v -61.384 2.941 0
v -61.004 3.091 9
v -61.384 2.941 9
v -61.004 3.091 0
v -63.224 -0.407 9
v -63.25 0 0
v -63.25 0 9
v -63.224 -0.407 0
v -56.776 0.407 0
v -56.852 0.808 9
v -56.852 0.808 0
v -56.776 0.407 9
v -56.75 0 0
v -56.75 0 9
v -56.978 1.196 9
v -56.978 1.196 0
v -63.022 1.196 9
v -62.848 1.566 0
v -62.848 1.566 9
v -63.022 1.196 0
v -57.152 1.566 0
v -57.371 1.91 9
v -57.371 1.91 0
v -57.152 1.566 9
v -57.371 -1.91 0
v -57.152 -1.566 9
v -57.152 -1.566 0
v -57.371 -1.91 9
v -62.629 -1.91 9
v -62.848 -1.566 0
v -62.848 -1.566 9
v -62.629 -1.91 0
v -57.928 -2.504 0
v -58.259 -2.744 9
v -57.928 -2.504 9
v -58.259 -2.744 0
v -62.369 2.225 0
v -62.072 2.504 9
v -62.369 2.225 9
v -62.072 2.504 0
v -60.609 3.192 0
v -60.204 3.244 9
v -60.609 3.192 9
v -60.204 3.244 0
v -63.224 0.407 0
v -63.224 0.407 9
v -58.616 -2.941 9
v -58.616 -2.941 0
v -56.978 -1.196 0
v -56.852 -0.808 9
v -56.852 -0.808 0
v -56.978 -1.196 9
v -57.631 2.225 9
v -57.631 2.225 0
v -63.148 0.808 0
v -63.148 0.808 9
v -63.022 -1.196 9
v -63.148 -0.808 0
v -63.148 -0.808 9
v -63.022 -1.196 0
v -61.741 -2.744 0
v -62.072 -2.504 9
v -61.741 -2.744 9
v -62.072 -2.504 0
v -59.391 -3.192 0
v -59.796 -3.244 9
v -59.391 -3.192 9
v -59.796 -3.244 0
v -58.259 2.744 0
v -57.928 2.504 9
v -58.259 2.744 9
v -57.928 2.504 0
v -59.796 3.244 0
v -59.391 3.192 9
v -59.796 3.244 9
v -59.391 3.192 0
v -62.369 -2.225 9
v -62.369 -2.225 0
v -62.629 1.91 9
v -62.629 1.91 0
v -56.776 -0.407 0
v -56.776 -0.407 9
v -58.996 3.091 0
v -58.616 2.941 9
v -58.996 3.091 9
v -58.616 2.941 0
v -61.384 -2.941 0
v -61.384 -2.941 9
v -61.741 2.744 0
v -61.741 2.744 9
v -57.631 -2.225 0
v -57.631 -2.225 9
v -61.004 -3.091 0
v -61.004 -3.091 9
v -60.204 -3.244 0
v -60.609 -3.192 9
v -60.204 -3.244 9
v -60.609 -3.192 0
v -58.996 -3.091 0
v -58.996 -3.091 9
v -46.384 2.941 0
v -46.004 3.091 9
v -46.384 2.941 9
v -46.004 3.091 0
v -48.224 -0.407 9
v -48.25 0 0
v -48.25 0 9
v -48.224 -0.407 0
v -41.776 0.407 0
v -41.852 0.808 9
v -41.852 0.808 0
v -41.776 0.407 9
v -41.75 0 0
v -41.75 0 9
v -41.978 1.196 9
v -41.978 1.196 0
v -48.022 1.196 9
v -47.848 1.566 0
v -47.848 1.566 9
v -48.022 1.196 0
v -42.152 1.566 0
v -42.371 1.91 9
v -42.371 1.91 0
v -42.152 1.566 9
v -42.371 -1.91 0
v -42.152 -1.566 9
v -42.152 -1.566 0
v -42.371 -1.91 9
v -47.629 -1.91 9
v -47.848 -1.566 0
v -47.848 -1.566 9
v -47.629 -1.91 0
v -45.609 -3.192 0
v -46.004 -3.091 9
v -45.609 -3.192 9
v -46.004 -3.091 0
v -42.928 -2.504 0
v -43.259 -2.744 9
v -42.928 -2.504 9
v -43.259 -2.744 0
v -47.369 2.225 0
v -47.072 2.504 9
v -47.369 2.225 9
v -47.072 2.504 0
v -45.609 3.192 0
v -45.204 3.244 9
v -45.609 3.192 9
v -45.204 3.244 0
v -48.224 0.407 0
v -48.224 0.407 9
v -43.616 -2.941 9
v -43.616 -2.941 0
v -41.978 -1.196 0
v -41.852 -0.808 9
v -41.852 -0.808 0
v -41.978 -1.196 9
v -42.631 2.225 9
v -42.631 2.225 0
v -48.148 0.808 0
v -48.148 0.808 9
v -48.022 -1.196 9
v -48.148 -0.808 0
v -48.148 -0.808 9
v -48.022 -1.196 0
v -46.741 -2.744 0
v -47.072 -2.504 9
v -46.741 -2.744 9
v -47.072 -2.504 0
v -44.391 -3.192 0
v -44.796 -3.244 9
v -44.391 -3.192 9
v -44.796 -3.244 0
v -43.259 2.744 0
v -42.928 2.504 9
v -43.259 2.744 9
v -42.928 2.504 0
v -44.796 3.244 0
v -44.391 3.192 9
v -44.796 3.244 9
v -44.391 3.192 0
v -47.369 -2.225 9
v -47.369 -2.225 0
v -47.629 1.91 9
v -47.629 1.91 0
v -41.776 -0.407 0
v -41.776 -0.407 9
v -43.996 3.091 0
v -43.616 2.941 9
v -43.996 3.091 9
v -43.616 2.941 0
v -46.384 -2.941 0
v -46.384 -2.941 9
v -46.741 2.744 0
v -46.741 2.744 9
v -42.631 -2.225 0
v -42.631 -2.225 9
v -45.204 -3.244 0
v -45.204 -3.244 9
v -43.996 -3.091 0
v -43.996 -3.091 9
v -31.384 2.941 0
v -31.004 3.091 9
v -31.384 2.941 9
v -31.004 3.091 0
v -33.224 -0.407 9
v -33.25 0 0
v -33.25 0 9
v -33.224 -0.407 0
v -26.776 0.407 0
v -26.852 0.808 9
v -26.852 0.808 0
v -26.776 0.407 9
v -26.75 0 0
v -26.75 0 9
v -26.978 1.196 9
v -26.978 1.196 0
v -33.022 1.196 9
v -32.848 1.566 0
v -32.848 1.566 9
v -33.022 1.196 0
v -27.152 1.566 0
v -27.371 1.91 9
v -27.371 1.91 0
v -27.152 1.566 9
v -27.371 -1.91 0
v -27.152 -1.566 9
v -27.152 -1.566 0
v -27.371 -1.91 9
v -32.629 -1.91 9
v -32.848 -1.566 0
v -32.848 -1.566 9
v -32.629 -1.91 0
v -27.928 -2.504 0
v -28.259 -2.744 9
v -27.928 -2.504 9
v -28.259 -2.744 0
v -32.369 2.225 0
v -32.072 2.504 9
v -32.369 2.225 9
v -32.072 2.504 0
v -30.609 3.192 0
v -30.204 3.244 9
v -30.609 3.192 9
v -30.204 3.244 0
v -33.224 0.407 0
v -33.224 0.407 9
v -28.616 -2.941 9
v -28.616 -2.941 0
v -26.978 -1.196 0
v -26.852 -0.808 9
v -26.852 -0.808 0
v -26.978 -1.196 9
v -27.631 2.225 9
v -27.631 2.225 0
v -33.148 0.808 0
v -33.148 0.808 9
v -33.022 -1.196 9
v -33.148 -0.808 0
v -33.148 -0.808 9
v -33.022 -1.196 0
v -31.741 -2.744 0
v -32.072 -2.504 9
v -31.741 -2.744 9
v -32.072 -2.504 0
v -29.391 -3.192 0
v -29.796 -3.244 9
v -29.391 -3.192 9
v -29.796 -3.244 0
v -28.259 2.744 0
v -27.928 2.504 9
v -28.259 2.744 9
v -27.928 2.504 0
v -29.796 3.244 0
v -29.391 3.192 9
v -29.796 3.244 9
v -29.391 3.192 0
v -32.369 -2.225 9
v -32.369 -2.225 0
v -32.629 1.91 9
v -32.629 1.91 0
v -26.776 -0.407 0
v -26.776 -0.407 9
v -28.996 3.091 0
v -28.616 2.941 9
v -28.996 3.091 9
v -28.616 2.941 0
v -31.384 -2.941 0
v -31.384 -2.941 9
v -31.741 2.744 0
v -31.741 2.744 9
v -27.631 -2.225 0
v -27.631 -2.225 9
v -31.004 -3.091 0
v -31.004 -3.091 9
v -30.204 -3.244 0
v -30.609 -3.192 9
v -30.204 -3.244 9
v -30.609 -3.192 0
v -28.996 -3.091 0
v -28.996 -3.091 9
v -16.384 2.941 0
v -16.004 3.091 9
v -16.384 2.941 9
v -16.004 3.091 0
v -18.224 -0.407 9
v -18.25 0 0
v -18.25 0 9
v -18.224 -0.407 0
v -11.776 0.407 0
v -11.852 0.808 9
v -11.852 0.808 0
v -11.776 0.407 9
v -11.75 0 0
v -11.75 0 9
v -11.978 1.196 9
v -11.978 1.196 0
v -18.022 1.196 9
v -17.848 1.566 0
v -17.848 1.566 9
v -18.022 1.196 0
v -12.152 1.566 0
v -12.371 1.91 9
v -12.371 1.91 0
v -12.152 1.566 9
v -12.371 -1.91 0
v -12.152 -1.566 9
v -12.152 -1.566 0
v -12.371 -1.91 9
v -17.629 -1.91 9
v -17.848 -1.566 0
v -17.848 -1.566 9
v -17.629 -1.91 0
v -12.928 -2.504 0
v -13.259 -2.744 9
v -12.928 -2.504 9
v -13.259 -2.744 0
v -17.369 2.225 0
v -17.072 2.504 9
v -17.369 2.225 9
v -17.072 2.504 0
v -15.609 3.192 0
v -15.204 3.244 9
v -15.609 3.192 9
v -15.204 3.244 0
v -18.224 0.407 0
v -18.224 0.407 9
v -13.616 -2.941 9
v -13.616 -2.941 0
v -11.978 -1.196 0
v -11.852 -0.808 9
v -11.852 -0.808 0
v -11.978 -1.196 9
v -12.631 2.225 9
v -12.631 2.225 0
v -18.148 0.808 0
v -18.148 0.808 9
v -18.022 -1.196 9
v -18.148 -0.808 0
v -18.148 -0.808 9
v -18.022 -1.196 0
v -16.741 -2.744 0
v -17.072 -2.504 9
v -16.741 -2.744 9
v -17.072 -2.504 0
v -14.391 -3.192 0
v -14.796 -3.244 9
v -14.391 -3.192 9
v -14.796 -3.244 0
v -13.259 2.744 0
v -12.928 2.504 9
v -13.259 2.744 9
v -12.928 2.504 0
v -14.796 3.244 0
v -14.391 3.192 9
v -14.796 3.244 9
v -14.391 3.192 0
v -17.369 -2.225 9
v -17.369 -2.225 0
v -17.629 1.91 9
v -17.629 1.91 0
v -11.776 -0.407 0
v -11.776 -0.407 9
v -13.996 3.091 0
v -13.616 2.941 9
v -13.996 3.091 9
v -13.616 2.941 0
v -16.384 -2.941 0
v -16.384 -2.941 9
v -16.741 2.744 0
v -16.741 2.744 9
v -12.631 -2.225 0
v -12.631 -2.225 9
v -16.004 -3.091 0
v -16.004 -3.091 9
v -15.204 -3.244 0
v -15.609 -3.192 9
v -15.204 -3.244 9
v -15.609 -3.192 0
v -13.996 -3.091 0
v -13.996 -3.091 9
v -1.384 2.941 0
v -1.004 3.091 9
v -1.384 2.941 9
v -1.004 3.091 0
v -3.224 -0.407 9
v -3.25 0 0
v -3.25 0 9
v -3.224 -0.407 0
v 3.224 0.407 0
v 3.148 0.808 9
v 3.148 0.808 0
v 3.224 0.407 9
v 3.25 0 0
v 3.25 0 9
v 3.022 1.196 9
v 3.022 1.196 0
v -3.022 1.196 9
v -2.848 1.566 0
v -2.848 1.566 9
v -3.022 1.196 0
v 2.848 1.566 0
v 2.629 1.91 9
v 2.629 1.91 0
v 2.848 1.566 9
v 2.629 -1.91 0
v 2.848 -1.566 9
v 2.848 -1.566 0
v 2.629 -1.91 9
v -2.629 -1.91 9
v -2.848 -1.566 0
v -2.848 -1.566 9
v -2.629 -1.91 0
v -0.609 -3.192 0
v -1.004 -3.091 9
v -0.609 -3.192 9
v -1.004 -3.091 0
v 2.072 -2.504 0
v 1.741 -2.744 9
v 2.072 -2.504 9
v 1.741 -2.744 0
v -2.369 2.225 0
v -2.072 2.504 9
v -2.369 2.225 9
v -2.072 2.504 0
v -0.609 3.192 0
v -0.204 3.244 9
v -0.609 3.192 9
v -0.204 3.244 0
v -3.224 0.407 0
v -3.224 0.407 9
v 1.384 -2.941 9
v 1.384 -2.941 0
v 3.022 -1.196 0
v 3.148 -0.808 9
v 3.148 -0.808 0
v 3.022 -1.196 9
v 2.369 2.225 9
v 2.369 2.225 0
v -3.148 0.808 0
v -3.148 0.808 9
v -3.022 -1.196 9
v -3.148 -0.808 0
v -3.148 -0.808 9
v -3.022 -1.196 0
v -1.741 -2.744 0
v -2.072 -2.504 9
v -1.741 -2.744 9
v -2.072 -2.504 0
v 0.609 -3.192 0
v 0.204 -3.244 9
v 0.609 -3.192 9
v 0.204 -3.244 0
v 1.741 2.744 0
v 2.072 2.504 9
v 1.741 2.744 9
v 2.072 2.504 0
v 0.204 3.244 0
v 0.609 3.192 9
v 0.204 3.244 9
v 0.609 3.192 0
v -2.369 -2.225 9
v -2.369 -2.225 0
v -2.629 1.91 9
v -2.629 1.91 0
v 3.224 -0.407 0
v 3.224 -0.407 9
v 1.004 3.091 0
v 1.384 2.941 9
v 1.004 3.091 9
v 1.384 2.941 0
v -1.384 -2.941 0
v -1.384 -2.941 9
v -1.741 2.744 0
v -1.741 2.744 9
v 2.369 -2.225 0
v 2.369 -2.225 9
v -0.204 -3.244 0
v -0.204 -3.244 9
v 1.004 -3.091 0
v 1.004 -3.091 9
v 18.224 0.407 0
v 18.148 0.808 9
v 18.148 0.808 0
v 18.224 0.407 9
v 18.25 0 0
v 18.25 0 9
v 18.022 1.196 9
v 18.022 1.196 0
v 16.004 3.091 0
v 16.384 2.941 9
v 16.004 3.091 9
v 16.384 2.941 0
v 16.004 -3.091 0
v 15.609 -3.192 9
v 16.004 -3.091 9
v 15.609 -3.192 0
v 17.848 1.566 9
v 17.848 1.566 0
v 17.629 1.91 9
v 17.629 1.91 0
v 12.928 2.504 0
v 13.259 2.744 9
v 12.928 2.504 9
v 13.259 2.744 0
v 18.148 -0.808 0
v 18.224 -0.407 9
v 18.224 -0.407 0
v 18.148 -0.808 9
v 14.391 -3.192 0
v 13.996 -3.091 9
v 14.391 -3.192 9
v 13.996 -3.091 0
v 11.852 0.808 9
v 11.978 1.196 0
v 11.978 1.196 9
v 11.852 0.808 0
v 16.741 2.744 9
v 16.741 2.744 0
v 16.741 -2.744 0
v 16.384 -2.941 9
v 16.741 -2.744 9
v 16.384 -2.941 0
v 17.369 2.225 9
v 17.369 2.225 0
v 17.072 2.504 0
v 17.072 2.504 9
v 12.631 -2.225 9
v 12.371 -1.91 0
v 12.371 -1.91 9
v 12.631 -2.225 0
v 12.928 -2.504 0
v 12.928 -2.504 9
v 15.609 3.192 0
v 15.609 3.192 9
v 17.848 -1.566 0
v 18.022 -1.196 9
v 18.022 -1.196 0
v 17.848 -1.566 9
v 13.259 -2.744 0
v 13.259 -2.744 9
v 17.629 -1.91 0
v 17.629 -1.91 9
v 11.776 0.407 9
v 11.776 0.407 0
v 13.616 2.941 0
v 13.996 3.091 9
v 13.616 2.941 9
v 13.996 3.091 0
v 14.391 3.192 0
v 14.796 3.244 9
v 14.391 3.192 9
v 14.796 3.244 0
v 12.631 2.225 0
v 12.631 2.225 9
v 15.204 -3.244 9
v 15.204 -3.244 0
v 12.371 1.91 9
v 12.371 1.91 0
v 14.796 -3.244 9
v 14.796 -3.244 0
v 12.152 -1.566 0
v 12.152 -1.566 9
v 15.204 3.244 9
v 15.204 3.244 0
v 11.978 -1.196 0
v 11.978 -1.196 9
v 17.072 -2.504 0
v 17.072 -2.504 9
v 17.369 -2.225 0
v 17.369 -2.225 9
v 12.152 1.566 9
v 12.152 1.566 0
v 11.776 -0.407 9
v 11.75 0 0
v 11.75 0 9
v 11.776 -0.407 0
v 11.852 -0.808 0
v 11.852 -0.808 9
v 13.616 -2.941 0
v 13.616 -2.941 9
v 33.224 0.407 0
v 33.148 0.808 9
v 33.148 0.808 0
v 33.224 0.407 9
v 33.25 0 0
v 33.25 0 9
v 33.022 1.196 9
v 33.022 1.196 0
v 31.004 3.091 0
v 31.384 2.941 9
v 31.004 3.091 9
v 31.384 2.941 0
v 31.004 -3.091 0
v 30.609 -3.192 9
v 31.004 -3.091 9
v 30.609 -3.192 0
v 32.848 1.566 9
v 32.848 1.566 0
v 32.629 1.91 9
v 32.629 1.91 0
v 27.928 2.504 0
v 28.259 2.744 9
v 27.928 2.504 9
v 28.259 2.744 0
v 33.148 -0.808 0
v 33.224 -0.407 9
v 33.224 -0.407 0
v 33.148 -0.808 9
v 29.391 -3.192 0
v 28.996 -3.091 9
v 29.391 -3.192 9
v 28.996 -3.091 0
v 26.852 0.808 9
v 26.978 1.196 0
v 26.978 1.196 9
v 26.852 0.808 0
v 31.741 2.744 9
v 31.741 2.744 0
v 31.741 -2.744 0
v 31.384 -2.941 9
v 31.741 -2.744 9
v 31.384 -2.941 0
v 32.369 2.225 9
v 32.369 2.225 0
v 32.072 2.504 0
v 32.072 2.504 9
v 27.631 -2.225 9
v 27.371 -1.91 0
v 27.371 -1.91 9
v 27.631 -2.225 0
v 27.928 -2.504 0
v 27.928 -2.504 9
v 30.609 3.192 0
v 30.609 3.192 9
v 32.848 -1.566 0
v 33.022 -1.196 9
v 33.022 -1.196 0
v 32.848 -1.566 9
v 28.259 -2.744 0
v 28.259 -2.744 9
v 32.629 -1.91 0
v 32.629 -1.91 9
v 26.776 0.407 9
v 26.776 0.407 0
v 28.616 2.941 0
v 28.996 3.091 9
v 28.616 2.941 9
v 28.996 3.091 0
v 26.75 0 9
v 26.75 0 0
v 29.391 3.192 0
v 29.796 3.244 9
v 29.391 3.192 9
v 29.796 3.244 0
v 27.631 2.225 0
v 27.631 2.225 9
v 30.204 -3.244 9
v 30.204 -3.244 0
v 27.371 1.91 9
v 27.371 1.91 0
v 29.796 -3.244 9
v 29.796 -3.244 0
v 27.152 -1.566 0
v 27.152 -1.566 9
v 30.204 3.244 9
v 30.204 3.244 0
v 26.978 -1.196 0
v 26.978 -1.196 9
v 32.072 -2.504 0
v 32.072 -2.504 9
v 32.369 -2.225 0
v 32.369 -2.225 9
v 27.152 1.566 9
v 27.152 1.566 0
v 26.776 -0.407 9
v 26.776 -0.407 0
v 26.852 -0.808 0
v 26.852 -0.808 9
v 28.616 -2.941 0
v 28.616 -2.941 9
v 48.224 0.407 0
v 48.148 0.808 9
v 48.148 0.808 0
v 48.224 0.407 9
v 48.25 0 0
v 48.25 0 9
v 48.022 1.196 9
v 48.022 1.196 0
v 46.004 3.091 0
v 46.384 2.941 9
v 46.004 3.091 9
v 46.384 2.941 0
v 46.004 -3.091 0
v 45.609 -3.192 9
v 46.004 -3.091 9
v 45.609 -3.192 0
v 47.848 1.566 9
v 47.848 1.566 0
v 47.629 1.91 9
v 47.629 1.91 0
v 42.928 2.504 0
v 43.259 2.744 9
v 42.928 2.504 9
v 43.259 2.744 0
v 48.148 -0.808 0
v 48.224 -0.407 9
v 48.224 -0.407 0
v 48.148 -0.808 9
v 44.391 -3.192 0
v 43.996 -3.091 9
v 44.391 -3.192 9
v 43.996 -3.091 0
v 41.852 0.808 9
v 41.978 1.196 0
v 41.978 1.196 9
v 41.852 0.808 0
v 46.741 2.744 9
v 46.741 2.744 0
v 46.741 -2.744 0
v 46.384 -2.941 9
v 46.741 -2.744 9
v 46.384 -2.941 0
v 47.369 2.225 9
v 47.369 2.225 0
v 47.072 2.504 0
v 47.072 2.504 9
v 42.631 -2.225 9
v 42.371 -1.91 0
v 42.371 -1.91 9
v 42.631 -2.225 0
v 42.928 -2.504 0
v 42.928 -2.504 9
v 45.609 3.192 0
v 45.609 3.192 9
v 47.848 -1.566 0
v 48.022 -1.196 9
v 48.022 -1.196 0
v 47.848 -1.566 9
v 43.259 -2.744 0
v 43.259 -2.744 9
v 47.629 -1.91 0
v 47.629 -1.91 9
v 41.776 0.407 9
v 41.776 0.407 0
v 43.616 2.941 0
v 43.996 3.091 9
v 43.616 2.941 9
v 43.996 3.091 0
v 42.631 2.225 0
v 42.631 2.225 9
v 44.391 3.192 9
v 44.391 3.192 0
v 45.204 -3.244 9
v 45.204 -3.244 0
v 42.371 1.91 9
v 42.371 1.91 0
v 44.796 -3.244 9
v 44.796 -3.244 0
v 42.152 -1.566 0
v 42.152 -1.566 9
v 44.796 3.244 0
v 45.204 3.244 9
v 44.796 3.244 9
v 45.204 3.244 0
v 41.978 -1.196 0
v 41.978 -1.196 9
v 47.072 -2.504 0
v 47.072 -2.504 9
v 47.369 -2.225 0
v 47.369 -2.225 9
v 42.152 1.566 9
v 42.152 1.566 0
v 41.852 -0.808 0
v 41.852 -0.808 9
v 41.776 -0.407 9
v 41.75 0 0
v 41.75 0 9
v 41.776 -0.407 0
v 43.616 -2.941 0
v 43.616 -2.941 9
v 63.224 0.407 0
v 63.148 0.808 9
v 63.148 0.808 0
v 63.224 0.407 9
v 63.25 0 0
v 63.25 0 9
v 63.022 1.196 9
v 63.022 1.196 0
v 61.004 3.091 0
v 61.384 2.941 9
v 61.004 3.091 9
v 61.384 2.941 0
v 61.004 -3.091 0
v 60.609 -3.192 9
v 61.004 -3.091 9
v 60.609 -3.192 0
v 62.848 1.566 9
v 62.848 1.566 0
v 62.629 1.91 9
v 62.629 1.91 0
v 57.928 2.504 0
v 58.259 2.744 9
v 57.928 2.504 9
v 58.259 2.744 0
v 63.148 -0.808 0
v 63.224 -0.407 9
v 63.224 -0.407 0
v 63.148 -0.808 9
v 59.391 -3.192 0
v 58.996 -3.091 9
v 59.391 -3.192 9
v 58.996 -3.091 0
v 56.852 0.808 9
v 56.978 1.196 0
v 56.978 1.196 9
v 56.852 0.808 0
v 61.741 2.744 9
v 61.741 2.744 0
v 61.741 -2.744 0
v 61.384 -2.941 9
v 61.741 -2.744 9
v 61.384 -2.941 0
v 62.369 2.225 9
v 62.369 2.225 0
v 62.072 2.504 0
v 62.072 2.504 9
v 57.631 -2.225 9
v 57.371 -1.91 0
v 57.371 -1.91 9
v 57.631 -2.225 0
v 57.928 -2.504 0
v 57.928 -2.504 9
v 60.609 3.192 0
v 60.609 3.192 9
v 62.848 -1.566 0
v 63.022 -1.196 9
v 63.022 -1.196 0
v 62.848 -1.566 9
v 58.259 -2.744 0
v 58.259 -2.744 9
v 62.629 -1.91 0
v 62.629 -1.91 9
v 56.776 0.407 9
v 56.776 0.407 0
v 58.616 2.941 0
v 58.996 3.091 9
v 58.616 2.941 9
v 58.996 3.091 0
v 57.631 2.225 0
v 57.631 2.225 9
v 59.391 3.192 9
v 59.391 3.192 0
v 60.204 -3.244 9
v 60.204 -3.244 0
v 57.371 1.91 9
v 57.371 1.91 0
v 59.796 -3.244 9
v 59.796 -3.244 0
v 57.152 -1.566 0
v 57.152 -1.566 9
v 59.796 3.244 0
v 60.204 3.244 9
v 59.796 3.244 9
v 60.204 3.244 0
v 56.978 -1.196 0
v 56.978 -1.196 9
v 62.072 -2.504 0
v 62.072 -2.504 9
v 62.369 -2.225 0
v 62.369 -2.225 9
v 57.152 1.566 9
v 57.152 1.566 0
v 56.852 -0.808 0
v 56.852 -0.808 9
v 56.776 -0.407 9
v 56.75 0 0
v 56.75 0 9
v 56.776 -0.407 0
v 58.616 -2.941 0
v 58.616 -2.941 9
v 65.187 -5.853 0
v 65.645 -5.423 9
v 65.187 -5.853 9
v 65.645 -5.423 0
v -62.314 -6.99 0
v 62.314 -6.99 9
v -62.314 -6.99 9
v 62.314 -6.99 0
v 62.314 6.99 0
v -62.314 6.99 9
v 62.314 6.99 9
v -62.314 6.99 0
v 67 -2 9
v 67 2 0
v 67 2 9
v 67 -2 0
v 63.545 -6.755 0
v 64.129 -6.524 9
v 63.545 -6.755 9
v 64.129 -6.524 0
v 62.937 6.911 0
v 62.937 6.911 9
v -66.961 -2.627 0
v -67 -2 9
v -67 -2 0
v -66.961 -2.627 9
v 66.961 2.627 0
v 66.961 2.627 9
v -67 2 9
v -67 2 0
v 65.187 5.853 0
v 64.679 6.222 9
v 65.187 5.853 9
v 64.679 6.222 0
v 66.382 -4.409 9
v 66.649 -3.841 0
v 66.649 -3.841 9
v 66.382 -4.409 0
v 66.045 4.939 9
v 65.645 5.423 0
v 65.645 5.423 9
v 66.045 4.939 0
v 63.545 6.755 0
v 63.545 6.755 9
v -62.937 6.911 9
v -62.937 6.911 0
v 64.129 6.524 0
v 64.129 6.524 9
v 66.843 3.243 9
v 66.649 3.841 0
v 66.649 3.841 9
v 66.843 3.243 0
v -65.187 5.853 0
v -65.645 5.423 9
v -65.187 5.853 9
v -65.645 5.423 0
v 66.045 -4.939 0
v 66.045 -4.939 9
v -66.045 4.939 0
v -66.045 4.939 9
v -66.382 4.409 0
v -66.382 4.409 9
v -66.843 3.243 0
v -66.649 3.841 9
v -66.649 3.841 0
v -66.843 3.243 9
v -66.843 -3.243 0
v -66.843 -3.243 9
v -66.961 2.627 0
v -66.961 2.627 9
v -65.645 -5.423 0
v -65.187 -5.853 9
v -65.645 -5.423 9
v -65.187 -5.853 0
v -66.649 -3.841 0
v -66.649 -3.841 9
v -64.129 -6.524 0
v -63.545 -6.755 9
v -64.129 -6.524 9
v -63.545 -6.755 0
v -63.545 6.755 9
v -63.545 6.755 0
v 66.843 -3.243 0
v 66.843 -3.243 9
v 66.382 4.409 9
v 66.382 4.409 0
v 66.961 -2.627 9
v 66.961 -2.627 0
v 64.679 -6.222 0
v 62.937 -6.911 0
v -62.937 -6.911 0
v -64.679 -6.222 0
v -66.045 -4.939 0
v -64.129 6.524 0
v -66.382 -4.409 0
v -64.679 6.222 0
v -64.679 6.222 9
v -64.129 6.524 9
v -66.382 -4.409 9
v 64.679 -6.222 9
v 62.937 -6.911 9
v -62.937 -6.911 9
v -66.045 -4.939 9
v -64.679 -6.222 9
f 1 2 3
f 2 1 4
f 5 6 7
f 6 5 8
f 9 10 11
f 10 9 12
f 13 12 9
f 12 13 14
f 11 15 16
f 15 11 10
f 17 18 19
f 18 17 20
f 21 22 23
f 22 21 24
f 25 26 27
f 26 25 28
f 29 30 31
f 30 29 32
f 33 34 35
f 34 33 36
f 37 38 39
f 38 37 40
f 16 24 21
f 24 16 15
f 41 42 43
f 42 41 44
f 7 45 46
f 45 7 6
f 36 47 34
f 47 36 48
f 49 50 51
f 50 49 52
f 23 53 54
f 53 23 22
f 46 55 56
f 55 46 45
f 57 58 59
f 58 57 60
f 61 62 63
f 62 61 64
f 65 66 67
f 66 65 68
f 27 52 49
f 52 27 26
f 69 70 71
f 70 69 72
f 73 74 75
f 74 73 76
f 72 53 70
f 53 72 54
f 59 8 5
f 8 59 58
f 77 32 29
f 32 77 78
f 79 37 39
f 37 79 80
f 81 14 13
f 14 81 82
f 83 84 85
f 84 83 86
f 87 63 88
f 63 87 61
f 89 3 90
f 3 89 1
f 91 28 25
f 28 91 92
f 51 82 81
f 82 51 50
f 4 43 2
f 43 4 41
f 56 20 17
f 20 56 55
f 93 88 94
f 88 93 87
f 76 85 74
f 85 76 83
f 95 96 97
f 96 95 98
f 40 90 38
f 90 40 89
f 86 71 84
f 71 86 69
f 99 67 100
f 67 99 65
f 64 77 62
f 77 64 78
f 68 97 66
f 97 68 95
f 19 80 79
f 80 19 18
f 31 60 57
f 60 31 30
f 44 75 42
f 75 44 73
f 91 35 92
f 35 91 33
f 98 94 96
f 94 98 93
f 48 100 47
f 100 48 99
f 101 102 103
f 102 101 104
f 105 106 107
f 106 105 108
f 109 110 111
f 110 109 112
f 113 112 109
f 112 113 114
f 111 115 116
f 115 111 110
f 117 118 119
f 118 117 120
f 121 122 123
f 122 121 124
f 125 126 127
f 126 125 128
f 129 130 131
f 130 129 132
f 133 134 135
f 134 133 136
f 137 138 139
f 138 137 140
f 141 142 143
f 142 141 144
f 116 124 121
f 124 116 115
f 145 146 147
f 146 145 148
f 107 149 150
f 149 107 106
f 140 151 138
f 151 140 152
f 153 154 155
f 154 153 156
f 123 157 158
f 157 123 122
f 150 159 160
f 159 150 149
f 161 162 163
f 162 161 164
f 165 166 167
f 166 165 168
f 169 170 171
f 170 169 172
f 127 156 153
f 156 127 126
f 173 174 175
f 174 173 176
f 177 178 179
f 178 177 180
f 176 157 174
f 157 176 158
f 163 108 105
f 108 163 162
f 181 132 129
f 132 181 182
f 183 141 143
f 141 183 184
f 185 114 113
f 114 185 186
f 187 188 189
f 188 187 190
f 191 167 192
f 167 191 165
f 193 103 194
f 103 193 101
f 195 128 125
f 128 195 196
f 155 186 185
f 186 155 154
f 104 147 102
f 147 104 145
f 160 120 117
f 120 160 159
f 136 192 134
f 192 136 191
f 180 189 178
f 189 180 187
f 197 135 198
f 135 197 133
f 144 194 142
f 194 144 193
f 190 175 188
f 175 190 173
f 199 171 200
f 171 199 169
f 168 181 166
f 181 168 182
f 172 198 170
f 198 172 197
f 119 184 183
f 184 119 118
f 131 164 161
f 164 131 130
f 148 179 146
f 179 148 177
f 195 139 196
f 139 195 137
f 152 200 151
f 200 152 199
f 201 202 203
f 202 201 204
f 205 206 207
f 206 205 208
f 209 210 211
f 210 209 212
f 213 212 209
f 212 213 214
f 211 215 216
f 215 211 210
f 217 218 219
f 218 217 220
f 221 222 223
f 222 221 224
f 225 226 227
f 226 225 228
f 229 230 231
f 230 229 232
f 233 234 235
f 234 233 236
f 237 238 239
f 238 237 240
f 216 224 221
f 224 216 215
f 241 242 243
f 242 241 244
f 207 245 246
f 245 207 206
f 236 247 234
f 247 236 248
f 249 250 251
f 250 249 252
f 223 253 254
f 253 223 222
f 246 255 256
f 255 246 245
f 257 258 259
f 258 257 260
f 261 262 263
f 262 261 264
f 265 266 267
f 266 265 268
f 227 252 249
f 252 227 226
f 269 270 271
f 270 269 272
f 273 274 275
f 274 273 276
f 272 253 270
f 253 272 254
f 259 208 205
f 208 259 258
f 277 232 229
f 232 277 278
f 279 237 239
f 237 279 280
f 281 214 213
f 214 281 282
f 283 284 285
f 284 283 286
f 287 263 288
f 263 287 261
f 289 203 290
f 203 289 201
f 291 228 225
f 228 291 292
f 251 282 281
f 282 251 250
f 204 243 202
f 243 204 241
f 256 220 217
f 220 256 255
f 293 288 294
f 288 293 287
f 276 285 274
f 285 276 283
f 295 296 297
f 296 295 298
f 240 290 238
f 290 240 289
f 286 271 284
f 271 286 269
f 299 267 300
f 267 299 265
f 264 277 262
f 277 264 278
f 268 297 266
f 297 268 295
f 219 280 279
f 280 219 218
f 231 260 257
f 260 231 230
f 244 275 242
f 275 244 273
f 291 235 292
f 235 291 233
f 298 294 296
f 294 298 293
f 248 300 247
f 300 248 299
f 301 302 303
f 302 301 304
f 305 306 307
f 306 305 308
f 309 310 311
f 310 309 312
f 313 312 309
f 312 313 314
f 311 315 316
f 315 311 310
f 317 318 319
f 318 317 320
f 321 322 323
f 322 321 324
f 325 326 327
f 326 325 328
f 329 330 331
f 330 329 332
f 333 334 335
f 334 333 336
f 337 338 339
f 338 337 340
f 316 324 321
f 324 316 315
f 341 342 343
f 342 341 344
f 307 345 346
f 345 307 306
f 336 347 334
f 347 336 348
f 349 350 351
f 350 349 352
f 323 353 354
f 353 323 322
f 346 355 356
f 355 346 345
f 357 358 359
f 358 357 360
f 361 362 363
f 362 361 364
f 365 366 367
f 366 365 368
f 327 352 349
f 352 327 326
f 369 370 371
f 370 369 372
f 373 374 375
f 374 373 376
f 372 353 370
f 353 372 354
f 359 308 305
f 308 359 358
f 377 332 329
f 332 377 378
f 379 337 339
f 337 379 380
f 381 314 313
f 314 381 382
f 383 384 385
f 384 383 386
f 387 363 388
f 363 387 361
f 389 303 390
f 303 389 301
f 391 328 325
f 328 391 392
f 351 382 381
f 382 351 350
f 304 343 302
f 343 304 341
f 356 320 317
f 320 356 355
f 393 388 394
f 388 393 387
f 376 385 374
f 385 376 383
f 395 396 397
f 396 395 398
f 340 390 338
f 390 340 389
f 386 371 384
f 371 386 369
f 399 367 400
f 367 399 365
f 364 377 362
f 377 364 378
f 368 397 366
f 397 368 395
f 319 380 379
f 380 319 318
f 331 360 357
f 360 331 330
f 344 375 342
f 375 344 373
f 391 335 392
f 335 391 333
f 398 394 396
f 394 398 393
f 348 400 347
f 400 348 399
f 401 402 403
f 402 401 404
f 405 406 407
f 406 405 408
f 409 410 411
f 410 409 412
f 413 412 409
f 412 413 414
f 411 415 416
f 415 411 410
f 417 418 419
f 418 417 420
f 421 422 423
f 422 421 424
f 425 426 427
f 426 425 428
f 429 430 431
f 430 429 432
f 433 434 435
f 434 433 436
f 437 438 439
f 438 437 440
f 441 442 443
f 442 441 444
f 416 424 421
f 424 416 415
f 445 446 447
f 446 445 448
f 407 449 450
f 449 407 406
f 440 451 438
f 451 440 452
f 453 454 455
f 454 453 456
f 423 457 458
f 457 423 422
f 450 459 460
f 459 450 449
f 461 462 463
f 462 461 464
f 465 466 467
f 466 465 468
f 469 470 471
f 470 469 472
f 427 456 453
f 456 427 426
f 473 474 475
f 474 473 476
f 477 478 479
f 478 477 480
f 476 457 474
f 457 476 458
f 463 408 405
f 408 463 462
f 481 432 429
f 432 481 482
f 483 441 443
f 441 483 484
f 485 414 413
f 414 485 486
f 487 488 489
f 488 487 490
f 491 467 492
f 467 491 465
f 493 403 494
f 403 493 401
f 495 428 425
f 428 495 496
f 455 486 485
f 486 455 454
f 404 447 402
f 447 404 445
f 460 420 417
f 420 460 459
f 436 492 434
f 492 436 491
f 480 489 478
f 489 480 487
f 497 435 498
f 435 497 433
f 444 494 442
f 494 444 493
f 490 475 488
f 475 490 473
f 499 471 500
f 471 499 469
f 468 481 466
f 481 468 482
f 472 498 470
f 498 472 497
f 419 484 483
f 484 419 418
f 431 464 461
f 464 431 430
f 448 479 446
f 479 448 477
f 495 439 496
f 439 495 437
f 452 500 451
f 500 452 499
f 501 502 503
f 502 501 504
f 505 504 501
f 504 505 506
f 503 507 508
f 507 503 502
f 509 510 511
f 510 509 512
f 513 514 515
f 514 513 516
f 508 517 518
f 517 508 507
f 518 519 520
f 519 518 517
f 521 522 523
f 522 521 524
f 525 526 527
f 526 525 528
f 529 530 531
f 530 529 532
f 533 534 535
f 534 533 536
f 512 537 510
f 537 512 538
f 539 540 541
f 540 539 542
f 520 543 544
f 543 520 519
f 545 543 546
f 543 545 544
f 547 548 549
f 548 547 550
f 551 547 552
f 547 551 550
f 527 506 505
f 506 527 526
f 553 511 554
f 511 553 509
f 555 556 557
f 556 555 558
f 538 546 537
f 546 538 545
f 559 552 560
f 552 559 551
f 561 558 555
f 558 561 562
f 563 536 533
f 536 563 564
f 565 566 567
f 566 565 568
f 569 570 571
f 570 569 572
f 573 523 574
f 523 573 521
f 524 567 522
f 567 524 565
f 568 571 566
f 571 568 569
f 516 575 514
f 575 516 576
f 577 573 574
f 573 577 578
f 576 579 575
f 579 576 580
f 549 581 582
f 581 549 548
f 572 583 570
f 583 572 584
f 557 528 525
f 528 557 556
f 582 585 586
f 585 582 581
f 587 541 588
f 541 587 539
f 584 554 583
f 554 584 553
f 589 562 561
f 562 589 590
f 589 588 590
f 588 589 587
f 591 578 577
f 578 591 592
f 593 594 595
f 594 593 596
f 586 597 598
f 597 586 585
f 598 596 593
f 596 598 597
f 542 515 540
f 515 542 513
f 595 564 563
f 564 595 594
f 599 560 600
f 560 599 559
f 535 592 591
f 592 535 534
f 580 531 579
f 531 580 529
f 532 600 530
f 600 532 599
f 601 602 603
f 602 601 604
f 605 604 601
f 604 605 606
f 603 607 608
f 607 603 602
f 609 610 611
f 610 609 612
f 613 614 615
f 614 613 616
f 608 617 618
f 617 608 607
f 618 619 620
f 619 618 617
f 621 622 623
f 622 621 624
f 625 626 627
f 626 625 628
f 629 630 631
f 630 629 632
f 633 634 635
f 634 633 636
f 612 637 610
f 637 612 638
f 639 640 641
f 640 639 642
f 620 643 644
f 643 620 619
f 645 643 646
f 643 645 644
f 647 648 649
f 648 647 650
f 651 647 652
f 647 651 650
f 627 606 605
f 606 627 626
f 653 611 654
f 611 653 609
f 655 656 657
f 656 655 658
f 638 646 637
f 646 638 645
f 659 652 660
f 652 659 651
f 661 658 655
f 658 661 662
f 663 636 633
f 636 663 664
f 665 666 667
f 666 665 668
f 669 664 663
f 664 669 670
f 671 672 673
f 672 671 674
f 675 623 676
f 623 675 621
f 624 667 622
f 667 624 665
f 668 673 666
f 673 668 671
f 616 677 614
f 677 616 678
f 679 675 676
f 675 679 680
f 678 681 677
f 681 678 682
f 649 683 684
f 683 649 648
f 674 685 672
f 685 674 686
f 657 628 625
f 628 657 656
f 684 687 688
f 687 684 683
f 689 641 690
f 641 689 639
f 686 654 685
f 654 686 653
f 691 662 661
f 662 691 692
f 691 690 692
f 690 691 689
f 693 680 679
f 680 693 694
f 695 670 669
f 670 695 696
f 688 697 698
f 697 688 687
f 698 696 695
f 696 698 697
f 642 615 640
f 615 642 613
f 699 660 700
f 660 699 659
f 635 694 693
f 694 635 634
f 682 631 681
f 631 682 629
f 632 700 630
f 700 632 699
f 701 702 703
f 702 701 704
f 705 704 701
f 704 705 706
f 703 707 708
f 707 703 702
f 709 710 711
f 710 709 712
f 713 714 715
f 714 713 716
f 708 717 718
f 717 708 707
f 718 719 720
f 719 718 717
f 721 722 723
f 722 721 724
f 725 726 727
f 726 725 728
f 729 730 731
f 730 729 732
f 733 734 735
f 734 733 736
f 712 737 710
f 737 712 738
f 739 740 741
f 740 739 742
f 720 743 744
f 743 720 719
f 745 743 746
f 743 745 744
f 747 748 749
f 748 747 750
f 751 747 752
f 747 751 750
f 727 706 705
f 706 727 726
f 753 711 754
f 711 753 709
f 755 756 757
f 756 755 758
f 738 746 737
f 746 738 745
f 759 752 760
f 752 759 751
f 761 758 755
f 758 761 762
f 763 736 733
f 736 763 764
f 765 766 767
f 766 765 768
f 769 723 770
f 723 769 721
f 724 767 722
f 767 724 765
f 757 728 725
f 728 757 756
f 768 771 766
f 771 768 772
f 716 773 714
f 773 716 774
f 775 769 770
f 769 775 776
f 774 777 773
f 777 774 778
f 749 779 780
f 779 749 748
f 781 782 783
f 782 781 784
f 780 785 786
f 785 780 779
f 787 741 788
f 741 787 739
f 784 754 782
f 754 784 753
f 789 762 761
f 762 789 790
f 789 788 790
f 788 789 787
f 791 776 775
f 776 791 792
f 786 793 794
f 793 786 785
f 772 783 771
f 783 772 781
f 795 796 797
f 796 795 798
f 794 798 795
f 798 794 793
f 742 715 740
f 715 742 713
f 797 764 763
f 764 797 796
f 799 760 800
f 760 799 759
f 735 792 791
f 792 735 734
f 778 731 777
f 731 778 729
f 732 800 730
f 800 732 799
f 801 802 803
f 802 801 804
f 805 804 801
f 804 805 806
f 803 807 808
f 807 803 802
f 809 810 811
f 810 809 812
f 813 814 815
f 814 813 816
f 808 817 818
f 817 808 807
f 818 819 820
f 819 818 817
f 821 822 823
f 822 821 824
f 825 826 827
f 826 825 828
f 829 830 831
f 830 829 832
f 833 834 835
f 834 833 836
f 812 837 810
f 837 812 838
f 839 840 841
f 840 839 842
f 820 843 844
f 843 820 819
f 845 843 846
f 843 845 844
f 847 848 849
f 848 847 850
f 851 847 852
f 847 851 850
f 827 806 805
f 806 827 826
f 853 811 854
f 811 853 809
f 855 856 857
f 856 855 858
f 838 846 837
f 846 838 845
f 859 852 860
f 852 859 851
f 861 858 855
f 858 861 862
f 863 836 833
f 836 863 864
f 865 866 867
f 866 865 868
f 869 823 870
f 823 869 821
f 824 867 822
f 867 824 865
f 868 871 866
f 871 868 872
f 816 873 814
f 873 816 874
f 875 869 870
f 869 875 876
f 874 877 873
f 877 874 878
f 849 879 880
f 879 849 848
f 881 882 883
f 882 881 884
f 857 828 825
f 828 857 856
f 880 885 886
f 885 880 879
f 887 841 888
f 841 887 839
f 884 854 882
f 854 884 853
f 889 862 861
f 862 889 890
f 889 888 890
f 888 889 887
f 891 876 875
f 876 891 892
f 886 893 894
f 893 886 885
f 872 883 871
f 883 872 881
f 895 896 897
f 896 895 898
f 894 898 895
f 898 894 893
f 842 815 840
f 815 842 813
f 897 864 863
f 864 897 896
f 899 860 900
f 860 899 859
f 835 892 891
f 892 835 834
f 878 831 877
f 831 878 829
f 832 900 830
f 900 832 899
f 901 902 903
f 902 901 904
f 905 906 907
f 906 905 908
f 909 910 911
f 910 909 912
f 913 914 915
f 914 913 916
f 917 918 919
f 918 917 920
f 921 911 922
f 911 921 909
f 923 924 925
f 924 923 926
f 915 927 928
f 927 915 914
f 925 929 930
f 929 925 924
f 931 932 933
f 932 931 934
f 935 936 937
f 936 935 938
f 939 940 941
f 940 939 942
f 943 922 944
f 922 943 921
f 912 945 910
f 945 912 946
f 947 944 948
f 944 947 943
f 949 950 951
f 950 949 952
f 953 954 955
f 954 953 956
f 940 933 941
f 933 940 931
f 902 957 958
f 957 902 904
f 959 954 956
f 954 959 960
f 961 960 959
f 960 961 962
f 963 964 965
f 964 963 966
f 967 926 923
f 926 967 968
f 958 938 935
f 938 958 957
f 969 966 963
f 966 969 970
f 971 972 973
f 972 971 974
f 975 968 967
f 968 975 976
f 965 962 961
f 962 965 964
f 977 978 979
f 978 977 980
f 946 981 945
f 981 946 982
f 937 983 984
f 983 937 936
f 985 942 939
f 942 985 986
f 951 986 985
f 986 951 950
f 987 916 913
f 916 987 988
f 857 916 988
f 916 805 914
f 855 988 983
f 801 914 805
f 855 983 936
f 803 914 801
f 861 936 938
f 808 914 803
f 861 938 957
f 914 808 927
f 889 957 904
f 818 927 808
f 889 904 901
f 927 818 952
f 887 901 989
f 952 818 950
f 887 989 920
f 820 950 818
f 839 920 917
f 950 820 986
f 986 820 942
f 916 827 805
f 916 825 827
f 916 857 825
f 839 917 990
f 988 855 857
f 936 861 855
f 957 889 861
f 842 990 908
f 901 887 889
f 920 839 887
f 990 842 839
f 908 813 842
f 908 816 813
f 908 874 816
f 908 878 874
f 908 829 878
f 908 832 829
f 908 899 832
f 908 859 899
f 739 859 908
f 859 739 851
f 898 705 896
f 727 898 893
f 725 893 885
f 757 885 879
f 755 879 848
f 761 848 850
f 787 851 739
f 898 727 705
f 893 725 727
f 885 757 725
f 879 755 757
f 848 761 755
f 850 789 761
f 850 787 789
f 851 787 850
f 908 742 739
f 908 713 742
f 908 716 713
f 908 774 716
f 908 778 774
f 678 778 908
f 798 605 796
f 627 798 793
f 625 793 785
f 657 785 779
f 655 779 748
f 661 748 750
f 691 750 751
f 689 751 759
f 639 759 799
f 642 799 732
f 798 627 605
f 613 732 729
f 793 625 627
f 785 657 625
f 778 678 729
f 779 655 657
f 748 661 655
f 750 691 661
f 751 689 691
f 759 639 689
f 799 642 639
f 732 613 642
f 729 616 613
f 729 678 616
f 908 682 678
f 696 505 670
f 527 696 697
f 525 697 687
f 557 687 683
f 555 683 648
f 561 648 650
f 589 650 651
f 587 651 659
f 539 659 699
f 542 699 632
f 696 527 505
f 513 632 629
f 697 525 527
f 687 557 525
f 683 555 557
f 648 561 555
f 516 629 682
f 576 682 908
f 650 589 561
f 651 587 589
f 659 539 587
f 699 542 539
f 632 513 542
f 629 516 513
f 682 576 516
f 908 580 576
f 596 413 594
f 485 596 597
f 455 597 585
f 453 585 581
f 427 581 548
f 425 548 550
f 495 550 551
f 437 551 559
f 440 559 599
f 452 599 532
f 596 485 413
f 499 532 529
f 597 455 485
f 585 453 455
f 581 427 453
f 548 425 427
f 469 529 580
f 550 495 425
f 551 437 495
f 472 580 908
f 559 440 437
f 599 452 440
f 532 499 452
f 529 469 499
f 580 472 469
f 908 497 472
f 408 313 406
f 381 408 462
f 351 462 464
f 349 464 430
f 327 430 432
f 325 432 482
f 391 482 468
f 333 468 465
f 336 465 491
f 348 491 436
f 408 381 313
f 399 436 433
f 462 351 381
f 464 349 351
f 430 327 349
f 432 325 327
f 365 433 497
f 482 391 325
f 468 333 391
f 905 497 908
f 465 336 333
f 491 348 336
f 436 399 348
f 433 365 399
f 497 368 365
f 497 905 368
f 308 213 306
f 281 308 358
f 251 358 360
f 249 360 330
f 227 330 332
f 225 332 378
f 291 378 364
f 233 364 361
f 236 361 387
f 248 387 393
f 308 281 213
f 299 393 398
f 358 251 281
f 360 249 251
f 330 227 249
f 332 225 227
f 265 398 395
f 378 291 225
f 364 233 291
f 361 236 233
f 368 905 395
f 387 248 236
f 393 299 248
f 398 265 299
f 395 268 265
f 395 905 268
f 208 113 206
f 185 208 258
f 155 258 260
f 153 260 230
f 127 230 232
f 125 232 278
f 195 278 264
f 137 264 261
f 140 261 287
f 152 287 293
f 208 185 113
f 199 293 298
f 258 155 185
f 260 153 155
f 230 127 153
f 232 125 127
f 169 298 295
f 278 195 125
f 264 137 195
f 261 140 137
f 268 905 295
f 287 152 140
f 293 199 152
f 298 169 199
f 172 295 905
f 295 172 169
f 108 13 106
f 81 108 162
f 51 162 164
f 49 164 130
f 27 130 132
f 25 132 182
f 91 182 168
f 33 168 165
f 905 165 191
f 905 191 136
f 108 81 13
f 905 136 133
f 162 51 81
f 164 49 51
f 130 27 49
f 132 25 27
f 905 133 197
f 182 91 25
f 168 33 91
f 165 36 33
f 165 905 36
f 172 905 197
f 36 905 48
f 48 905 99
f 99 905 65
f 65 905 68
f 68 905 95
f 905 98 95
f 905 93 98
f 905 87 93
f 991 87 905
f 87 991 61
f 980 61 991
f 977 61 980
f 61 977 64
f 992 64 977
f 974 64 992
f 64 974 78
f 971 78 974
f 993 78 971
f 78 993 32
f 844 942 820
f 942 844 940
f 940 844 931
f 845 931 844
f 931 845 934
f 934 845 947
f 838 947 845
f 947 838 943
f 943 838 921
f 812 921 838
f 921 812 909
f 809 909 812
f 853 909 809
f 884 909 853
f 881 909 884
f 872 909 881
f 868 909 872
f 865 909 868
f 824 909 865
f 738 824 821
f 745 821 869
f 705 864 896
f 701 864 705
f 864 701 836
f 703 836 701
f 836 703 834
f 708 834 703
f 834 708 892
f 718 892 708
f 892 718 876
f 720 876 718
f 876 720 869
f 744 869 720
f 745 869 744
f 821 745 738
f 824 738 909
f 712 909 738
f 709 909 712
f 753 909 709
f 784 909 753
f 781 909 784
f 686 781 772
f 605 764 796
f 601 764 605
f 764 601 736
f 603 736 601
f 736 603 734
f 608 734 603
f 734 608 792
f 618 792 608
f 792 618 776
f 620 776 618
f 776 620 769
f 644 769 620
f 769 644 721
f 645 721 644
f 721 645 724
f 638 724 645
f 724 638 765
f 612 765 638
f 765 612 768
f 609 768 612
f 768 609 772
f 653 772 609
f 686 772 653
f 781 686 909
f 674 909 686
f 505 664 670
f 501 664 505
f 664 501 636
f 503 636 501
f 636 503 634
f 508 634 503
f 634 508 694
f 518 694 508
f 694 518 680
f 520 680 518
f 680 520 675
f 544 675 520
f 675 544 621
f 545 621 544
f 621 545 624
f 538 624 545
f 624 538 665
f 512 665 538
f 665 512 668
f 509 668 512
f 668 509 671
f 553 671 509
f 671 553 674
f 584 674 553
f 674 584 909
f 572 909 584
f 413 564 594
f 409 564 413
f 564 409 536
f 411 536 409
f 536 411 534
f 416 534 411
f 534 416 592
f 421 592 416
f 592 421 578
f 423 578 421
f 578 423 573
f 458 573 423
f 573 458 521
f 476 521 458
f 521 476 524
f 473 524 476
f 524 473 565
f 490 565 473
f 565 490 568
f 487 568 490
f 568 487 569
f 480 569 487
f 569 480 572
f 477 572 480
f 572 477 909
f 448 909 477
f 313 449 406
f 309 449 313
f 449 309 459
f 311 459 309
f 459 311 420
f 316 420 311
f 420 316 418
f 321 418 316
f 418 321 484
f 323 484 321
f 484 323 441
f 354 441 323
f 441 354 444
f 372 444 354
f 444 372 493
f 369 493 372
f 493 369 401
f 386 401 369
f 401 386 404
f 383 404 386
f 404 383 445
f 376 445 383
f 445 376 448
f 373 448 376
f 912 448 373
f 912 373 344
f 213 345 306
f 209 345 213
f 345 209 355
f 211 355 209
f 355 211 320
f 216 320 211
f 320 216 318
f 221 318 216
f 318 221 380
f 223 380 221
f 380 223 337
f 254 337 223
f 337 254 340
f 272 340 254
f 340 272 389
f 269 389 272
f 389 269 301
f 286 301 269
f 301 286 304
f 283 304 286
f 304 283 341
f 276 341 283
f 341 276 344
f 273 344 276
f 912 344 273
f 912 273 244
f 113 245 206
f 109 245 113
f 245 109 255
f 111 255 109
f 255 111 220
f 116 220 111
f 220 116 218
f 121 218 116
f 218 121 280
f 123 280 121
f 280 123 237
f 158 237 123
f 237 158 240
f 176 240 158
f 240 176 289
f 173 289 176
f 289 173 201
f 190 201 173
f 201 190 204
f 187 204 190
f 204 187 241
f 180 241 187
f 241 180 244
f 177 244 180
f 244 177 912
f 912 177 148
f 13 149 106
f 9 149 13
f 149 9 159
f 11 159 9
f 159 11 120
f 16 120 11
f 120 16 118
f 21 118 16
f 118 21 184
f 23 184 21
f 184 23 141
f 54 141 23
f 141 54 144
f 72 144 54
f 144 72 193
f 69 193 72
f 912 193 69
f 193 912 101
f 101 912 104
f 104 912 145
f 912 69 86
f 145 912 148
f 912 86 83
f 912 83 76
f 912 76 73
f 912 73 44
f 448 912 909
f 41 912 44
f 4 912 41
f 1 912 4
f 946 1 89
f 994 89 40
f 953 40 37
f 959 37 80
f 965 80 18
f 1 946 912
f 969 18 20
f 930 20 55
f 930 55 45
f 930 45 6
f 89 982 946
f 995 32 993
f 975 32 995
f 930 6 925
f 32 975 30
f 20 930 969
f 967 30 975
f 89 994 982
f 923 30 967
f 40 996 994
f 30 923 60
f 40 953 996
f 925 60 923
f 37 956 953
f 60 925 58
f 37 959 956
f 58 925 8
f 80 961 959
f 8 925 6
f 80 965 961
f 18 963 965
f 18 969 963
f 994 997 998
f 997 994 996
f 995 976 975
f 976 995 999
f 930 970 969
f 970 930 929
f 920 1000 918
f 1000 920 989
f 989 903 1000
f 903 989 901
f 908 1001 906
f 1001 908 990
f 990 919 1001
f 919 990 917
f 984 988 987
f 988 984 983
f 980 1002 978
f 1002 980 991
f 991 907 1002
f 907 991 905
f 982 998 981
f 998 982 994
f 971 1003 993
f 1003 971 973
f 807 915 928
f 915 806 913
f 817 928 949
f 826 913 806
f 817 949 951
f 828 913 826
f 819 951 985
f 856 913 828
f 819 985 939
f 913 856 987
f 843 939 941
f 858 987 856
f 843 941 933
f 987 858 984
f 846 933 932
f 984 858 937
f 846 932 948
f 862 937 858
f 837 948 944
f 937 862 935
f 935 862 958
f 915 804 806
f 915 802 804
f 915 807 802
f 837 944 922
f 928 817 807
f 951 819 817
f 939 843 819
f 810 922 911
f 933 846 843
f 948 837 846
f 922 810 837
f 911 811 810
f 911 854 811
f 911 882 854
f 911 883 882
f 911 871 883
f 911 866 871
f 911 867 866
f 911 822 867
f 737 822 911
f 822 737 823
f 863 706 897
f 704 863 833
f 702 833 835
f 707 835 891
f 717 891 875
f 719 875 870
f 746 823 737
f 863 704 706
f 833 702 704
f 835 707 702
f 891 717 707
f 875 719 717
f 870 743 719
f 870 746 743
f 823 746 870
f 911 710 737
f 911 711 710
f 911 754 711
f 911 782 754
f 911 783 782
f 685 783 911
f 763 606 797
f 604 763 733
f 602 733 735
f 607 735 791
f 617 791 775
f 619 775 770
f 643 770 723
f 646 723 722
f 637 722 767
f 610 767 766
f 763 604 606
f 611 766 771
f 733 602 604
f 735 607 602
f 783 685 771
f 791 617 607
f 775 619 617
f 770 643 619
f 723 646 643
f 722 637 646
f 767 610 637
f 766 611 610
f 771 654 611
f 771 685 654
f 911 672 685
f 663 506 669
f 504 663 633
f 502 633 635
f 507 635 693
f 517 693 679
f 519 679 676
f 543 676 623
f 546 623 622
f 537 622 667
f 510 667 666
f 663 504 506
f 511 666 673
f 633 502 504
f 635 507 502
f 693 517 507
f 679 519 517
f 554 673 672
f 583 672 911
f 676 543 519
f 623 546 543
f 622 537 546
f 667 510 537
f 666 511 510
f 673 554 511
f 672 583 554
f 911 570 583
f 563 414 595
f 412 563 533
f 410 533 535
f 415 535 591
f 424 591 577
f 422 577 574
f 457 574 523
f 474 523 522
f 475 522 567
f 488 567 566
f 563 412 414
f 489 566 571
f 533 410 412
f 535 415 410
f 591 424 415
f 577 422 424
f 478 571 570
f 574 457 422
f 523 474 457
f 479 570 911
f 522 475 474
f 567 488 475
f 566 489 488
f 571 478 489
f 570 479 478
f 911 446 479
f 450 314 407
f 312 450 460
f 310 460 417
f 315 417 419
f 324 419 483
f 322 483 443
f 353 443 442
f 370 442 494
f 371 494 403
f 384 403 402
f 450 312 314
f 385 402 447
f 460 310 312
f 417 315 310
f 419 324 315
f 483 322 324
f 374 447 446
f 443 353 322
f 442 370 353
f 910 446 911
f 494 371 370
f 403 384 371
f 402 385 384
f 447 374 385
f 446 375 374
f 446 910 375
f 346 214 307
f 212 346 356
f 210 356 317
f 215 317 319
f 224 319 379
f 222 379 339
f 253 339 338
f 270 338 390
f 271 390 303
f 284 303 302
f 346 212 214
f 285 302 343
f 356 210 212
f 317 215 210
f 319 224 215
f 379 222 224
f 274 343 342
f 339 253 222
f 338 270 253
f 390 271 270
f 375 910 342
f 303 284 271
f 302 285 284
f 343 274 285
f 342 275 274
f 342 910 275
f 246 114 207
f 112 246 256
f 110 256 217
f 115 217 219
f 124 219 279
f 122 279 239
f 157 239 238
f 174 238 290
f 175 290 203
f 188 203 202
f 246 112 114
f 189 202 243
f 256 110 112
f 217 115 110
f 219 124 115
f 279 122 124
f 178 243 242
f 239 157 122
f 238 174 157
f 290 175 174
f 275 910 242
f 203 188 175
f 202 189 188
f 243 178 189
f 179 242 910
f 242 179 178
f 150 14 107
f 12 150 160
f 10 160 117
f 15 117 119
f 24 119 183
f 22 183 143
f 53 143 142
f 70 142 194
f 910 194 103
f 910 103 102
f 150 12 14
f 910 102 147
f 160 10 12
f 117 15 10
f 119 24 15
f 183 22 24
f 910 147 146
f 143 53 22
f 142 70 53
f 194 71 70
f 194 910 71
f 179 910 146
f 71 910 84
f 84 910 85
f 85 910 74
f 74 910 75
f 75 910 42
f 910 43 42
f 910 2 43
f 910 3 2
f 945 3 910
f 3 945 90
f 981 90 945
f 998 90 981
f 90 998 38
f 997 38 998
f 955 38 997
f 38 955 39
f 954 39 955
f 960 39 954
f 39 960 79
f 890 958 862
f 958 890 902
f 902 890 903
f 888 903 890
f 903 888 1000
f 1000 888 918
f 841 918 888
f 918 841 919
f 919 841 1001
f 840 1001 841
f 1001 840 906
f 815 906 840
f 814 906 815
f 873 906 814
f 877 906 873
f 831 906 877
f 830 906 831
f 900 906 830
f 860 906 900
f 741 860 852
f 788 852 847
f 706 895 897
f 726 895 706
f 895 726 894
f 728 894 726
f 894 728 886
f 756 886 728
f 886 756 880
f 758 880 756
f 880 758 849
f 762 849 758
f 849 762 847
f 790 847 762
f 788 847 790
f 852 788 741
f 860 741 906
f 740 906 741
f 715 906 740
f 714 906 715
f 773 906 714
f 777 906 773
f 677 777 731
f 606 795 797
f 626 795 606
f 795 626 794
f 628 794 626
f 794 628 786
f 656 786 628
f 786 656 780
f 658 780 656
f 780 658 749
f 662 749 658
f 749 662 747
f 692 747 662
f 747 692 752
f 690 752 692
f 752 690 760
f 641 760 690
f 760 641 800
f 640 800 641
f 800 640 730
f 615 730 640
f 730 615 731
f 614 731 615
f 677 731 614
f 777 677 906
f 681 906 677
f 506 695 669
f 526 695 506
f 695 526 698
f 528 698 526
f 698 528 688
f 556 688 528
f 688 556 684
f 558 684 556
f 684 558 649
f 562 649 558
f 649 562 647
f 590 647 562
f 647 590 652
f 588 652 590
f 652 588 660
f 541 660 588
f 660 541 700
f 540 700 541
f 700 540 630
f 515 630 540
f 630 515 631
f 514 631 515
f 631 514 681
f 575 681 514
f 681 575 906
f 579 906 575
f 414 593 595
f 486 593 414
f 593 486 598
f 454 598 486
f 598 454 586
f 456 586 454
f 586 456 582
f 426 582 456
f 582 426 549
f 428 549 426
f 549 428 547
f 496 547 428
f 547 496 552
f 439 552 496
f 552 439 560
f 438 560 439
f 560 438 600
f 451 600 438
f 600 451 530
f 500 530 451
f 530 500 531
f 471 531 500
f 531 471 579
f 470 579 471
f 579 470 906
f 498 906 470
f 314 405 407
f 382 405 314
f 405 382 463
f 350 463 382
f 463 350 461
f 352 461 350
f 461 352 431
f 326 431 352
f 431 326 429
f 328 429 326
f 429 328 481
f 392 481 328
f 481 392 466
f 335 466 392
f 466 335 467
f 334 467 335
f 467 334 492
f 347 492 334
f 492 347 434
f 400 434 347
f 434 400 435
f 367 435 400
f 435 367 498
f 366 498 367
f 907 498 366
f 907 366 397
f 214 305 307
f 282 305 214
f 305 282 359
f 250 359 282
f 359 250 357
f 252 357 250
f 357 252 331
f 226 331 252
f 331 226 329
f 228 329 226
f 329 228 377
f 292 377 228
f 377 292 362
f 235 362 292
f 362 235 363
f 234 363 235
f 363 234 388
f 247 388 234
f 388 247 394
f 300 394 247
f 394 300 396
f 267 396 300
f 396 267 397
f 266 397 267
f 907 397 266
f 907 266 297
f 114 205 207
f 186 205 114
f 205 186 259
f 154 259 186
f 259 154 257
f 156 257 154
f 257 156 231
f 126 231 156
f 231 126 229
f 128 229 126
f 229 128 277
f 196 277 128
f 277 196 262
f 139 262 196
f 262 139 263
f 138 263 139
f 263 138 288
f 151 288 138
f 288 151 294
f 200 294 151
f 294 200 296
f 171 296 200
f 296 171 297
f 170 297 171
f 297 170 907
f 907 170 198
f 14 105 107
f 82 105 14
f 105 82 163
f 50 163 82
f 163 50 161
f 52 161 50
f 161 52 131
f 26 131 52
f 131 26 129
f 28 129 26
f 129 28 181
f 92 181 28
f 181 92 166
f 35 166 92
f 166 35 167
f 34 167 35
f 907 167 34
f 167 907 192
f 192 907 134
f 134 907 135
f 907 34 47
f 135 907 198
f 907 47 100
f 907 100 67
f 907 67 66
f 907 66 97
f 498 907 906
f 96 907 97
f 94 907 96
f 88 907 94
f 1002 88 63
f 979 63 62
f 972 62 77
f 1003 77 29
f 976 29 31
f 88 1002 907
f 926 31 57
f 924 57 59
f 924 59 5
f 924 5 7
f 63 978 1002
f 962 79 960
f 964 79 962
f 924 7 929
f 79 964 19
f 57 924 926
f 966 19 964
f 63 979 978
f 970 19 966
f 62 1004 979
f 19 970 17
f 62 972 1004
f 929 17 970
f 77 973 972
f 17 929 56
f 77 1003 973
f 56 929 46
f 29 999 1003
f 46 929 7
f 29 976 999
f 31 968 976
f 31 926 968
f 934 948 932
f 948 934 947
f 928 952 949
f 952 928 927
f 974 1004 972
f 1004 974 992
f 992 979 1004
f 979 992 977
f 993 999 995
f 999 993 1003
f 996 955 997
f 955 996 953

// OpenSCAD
$fn = 50;


difference() {
	union() {
		hull() {
			translate(v = [-62.0000000000, 2.0000000000, 0]) {
				cylinder(h = 9, r = 5);
			}
			translate(v = [62.0000000000, 2.0000000000, 0]) {
				cylinder(h = 9, r = 5);
			}
			translate(v = [-62.0000000000, -2.0000000000, 0]) {
				cylinder(h = 9, r = 5);
			}
			translate(v = [62.0000000000, -2.0000000000, 0]) {
				cylinder(h = 9, r = 5);
			}
		}
	}
	union() {
		translate(v = [-60.0000000000, 0.0000000000, -100.0000000000]) {
			cylinder(h = 200, r = 3.2500000000);
		}
		translate(v = [-45.0000000000, 0.0000000000, -100.0000000000]) {
			cylinder(h = 200, r = 3.2500000000);
		}
		translate(v = [-30.0000000000, 0.0000000000, -100.0000000000]) {
			cylinder(h = 200, r = 3.2500000000);
		}
		translate(v = [-15.0000000000, 0.0000000000, -100.0000000000]) {
			cylinder(h = 200, r = 3.2500000000);
		}
		translate(v = [0.0000000000, 0.0000000000, -100.0000000000]) {
			cylinder(h = 200, r = 3.2500000000);
		}
		translate(v = [15.0000000000, 0.0000000000, -100.0000000000]) {
			cylinder(h = 200, r = 3.2500000000);
		}
		translate(v = [30.0000000000, 0.0000000000, -100.0000000000]) {
			cylinder(h = 200, r = 3.2500000000);
		}
		translate(v = [45.0000000000, 0.0000000000, -100.0000000000]) {
			cylinder(h = 200, r = 3.2500000000);
		}
		translate(v = [60.0000000000, 0.0000000000, -100.0000000000]) {
			cylinder(h = 200, r = 3.2500000000);
		}
	}
}
